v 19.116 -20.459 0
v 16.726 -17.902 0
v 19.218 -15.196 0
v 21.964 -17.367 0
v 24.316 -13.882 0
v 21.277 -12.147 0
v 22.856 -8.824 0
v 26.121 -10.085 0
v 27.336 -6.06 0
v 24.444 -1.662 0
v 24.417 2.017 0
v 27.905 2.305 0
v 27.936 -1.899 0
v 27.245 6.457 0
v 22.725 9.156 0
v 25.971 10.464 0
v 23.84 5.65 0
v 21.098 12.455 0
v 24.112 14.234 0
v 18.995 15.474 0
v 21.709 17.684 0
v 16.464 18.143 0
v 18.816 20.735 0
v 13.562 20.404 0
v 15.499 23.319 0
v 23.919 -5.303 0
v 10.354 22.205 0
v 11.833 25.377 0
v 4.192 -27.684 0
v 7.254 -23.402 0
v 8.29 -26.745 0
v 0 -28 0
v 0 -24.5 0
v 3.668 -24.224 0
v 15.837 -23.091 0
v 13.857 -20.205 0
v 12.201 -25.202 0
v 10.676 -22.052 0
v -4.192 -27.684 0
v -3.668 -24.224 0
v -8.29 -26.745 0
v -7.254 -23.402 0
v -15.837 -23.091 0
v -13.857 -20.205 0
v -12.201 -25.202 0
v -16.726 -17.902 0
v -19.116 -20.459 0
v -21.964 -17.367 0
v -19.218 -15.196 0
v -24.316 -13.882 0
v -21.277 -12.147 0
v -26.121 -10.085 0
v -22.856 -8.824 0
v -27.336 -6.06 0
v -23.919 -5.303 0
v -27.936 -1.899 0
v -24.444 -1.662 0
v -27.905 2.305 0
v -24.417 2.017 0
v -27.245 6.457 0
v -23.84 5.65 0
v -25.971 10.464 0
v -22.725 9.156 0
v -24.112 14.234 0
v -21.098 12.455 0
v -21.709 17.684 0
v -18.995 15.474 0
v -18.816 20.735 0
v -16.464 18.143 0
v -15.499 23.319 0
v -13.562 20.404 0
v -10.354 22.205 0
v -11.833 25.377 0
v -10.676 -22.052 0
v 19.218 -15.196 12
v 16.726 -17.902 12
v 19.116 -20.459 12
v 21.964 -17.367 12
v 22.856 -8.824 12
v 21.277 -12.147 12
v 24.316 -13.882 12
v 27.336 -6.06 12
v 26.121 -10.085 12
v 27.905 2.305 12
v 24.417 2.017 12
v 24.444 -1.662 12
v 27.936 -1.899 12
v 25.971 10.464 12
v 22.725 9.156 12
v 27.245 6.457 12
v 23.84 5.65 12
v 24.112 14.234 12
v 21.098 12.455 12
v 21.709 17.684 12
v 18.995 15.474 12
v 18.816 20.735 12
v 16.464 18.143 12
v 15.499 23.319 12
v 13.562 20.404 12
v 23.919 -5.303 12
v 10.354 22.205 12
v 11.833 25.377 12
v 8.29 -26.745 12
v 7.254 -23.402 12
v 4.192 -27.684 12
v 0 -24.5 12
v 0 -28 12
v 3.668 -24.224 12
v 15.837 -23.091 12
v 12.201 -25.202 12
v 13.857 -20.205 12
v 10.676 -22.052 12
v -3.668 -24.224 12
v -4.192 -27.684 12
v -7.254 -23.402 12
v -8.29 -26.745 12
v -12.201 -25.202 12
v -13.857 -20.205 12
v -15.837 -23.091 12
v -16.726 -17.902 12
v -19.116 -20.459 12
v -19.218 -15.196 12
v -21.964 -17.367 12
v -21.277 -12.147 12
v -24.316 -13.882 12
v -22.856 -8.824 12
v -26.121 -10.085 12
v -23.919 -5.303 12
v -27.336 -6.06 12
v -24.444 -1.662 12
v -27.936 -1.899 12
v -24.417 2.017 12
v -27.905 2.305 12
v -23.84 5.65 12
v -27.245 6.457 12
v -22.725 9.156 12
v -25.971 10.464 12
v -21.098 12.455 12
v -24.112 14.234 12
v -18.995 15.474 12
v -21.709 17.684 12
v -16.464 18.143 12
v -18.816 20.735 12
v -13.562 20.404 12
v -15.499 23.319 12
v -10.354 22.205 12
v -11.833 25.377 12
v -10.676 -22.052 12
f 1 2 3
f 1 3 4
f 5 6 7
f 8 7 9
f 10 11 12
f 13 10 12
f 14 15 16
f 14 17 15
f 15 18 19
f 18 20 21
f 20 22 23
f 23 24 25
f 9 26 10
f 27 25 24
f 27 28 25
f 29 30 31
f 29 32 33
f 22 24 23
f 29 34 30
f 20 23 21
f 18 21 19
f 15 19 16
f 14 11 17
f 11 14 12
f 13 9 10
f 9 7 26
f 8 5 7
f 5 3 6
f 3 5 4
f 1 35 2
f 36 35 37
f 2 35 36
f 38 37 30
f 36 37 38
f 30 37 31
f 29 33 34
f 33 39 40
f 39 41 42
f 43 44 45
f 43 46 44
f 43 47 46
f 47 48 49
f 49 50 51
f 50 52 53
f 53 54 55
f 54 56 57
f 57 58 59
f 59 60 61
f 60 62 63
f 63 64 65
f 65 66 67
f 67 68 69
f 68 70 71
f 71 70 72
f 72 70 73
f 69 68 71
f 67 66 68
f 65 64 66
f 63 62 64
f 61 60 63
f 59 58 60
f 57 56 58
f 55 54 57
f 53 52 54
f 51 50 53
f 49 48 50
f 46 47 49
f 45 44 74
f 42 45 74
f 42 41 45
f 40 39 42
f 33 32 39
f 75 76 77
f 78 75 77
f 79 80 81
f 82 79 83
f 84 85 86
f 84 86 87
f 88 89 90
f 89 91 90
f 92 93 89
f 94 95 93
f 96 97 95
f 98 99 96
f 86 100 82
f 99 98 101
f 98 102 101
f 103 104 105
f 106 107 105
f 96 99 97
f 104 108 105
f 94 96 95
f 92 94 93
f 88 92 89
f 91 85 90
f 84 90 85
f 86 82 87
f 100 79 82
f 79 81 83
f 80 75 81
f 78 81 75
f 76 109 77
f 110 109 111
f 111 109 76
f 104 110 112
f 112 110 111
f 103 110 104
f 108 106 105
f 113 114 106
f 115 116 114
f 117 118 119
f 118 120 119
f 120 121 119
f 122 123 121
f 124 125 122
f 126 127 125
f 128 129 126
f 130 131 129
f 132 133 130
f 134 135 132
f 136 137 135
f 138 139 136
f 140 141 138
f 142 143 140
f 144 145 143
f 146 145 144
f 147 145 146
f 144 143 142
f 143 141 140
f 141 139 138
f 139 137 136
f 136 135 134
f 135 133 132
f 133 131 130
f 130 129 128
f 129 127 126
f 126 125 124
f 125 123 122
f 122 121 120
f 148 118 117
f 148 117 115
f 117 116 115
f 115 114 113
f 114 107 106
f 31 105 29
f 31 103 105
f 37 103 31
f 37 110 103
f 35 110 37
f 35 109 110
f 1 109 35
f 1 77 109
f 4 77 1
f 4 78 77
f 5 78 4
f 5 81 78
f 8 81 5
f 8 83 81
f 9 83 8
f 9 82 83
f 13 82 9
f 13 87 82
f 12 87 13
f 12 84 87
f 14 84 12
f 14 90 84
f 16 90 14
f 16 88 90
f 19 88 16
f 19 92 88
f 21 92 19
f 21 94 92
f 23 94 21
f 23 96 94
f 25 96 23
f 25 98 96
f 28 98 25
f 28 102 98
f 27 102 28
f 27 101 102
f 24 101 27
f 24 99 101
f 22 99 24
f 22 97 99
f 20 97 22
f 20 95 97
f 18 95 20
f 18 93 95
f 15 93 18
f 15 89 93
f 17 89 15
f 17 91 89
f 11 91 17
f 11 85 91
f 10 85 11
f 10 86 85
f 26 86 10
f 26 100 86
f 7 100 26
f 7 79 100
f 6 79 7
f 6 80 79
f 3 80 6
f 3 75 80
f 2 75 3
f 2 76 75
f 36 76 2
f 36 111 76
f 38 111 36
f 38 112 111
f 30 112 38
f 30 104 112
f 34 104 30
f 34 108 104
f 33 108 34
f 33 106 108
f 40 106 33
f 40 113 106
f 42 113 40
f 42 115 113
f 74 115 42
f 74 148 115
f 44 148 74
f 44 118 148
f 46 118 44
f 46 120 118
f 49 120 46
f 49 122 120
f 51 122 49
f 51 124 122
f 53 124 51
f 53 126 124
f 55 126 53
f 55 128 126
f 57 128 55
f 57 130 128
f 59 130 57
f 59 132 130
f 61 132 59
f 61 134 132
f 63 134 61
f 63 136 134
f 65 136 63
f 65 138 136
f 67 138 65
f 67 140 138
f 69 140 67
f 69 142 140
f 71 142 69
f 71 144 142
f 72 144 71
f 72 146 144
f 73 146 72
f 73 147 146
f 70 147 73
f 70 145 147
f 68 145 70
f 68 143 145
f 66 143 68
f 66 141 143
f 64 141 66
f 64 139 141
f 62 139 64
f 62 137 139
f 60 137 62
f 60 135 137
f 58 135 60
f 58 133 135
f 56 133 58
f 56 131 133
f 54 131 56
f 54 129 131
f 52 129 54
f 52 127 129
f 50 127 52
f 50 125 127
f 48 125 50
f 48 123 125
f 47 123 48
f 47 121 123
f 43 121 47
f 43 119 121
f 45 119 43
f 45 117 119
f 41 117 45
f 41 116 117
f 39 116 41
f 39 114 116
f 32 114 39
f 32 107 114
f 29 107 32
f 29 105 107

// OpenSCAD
$fn = 32;

// ----------------------------------------------------------------------
// Spring clip: 56 mm outside, 3.5 mm band, 50 degree opening
// ----------------------------------------------------------------------

// --- parameters (mm) ---
outer_r = 28;             // clip outside radius
inner_r = 24.5;           // clip bore radius
band = 3.5;               // band thickness
clip_w = 12;              // clip width
opening = 50;             // opening angle

clip_profile = [[-11.833, 25.377], [-15.499, 23.319], [-18.816, 20.735], [-21.709, 17.684], [-24.112, 14.234], [-25.971, 10.464], [-27.245, 6.457], [-27.905, 2.305], [-27.936, -1.899], [-27.336, -6.06], [-26.121, -10.085], [-24.316, -13.882], [-21.964, -17.367], [-19.116, -20.459], [-15.837, -23.091], [-12.201, -25.202], [-8.29, -26.745], [-4.192, -27.684], [0, -28], [4.192, -27.684], [8.29, -26.745], [12.201, -25.202], [15.837, -23.091], [19.116, -20.459], [21.964, -17.367], [24.316, -13.882], [26.121, -10.085], [27.336, -6.06], [27.936, -1.899], [27.905, 2.305], [27.245, 6.457], [25.971, 10.464], [24.112, 14.234], [21.709, 17.684], [18.816, 20.735], [15.499, 23.319], [11.833, 25.377], [10.354, 22.205], [13.562, 20.404], [16.464, 18.143], [18.995, 15.474], [21.098, 12.455], [22.725, 9.156], [23.84, 5.65], [24.417, 2.017], [24.444, -1.662], [23.919, -5.303], [22.856, -8.824], [21.277, -12.147], [19.218, -15.196], [16.726, -17.902], [13.857, -20.205], [10.676, -22.052], [7.254, -23.402], [3.668, -24.224], [0, -24.5], [-3.668, -24.224], [-7.254, -23.402], [-10.676, -22.052], [-13.857, -20.205], [-16.726, -17.902], [-19.218, -15.196], [-21.277, -12.147], [-22.856, -8.824], [-23.919, -5.303], [-24.444, -1.662], [-24.417, 2.017], [-23.84, 5.65], [-22.725, 9.156], [-21.098, 12.455], [-18.995, 15.474], [-16.464, 18.143], [-13.562, 20.404], [-10.354, 22.205]];

difference() {
  union() {
    linear_extrude(height = clip_w) polygon(clip_profile);
  }
}
